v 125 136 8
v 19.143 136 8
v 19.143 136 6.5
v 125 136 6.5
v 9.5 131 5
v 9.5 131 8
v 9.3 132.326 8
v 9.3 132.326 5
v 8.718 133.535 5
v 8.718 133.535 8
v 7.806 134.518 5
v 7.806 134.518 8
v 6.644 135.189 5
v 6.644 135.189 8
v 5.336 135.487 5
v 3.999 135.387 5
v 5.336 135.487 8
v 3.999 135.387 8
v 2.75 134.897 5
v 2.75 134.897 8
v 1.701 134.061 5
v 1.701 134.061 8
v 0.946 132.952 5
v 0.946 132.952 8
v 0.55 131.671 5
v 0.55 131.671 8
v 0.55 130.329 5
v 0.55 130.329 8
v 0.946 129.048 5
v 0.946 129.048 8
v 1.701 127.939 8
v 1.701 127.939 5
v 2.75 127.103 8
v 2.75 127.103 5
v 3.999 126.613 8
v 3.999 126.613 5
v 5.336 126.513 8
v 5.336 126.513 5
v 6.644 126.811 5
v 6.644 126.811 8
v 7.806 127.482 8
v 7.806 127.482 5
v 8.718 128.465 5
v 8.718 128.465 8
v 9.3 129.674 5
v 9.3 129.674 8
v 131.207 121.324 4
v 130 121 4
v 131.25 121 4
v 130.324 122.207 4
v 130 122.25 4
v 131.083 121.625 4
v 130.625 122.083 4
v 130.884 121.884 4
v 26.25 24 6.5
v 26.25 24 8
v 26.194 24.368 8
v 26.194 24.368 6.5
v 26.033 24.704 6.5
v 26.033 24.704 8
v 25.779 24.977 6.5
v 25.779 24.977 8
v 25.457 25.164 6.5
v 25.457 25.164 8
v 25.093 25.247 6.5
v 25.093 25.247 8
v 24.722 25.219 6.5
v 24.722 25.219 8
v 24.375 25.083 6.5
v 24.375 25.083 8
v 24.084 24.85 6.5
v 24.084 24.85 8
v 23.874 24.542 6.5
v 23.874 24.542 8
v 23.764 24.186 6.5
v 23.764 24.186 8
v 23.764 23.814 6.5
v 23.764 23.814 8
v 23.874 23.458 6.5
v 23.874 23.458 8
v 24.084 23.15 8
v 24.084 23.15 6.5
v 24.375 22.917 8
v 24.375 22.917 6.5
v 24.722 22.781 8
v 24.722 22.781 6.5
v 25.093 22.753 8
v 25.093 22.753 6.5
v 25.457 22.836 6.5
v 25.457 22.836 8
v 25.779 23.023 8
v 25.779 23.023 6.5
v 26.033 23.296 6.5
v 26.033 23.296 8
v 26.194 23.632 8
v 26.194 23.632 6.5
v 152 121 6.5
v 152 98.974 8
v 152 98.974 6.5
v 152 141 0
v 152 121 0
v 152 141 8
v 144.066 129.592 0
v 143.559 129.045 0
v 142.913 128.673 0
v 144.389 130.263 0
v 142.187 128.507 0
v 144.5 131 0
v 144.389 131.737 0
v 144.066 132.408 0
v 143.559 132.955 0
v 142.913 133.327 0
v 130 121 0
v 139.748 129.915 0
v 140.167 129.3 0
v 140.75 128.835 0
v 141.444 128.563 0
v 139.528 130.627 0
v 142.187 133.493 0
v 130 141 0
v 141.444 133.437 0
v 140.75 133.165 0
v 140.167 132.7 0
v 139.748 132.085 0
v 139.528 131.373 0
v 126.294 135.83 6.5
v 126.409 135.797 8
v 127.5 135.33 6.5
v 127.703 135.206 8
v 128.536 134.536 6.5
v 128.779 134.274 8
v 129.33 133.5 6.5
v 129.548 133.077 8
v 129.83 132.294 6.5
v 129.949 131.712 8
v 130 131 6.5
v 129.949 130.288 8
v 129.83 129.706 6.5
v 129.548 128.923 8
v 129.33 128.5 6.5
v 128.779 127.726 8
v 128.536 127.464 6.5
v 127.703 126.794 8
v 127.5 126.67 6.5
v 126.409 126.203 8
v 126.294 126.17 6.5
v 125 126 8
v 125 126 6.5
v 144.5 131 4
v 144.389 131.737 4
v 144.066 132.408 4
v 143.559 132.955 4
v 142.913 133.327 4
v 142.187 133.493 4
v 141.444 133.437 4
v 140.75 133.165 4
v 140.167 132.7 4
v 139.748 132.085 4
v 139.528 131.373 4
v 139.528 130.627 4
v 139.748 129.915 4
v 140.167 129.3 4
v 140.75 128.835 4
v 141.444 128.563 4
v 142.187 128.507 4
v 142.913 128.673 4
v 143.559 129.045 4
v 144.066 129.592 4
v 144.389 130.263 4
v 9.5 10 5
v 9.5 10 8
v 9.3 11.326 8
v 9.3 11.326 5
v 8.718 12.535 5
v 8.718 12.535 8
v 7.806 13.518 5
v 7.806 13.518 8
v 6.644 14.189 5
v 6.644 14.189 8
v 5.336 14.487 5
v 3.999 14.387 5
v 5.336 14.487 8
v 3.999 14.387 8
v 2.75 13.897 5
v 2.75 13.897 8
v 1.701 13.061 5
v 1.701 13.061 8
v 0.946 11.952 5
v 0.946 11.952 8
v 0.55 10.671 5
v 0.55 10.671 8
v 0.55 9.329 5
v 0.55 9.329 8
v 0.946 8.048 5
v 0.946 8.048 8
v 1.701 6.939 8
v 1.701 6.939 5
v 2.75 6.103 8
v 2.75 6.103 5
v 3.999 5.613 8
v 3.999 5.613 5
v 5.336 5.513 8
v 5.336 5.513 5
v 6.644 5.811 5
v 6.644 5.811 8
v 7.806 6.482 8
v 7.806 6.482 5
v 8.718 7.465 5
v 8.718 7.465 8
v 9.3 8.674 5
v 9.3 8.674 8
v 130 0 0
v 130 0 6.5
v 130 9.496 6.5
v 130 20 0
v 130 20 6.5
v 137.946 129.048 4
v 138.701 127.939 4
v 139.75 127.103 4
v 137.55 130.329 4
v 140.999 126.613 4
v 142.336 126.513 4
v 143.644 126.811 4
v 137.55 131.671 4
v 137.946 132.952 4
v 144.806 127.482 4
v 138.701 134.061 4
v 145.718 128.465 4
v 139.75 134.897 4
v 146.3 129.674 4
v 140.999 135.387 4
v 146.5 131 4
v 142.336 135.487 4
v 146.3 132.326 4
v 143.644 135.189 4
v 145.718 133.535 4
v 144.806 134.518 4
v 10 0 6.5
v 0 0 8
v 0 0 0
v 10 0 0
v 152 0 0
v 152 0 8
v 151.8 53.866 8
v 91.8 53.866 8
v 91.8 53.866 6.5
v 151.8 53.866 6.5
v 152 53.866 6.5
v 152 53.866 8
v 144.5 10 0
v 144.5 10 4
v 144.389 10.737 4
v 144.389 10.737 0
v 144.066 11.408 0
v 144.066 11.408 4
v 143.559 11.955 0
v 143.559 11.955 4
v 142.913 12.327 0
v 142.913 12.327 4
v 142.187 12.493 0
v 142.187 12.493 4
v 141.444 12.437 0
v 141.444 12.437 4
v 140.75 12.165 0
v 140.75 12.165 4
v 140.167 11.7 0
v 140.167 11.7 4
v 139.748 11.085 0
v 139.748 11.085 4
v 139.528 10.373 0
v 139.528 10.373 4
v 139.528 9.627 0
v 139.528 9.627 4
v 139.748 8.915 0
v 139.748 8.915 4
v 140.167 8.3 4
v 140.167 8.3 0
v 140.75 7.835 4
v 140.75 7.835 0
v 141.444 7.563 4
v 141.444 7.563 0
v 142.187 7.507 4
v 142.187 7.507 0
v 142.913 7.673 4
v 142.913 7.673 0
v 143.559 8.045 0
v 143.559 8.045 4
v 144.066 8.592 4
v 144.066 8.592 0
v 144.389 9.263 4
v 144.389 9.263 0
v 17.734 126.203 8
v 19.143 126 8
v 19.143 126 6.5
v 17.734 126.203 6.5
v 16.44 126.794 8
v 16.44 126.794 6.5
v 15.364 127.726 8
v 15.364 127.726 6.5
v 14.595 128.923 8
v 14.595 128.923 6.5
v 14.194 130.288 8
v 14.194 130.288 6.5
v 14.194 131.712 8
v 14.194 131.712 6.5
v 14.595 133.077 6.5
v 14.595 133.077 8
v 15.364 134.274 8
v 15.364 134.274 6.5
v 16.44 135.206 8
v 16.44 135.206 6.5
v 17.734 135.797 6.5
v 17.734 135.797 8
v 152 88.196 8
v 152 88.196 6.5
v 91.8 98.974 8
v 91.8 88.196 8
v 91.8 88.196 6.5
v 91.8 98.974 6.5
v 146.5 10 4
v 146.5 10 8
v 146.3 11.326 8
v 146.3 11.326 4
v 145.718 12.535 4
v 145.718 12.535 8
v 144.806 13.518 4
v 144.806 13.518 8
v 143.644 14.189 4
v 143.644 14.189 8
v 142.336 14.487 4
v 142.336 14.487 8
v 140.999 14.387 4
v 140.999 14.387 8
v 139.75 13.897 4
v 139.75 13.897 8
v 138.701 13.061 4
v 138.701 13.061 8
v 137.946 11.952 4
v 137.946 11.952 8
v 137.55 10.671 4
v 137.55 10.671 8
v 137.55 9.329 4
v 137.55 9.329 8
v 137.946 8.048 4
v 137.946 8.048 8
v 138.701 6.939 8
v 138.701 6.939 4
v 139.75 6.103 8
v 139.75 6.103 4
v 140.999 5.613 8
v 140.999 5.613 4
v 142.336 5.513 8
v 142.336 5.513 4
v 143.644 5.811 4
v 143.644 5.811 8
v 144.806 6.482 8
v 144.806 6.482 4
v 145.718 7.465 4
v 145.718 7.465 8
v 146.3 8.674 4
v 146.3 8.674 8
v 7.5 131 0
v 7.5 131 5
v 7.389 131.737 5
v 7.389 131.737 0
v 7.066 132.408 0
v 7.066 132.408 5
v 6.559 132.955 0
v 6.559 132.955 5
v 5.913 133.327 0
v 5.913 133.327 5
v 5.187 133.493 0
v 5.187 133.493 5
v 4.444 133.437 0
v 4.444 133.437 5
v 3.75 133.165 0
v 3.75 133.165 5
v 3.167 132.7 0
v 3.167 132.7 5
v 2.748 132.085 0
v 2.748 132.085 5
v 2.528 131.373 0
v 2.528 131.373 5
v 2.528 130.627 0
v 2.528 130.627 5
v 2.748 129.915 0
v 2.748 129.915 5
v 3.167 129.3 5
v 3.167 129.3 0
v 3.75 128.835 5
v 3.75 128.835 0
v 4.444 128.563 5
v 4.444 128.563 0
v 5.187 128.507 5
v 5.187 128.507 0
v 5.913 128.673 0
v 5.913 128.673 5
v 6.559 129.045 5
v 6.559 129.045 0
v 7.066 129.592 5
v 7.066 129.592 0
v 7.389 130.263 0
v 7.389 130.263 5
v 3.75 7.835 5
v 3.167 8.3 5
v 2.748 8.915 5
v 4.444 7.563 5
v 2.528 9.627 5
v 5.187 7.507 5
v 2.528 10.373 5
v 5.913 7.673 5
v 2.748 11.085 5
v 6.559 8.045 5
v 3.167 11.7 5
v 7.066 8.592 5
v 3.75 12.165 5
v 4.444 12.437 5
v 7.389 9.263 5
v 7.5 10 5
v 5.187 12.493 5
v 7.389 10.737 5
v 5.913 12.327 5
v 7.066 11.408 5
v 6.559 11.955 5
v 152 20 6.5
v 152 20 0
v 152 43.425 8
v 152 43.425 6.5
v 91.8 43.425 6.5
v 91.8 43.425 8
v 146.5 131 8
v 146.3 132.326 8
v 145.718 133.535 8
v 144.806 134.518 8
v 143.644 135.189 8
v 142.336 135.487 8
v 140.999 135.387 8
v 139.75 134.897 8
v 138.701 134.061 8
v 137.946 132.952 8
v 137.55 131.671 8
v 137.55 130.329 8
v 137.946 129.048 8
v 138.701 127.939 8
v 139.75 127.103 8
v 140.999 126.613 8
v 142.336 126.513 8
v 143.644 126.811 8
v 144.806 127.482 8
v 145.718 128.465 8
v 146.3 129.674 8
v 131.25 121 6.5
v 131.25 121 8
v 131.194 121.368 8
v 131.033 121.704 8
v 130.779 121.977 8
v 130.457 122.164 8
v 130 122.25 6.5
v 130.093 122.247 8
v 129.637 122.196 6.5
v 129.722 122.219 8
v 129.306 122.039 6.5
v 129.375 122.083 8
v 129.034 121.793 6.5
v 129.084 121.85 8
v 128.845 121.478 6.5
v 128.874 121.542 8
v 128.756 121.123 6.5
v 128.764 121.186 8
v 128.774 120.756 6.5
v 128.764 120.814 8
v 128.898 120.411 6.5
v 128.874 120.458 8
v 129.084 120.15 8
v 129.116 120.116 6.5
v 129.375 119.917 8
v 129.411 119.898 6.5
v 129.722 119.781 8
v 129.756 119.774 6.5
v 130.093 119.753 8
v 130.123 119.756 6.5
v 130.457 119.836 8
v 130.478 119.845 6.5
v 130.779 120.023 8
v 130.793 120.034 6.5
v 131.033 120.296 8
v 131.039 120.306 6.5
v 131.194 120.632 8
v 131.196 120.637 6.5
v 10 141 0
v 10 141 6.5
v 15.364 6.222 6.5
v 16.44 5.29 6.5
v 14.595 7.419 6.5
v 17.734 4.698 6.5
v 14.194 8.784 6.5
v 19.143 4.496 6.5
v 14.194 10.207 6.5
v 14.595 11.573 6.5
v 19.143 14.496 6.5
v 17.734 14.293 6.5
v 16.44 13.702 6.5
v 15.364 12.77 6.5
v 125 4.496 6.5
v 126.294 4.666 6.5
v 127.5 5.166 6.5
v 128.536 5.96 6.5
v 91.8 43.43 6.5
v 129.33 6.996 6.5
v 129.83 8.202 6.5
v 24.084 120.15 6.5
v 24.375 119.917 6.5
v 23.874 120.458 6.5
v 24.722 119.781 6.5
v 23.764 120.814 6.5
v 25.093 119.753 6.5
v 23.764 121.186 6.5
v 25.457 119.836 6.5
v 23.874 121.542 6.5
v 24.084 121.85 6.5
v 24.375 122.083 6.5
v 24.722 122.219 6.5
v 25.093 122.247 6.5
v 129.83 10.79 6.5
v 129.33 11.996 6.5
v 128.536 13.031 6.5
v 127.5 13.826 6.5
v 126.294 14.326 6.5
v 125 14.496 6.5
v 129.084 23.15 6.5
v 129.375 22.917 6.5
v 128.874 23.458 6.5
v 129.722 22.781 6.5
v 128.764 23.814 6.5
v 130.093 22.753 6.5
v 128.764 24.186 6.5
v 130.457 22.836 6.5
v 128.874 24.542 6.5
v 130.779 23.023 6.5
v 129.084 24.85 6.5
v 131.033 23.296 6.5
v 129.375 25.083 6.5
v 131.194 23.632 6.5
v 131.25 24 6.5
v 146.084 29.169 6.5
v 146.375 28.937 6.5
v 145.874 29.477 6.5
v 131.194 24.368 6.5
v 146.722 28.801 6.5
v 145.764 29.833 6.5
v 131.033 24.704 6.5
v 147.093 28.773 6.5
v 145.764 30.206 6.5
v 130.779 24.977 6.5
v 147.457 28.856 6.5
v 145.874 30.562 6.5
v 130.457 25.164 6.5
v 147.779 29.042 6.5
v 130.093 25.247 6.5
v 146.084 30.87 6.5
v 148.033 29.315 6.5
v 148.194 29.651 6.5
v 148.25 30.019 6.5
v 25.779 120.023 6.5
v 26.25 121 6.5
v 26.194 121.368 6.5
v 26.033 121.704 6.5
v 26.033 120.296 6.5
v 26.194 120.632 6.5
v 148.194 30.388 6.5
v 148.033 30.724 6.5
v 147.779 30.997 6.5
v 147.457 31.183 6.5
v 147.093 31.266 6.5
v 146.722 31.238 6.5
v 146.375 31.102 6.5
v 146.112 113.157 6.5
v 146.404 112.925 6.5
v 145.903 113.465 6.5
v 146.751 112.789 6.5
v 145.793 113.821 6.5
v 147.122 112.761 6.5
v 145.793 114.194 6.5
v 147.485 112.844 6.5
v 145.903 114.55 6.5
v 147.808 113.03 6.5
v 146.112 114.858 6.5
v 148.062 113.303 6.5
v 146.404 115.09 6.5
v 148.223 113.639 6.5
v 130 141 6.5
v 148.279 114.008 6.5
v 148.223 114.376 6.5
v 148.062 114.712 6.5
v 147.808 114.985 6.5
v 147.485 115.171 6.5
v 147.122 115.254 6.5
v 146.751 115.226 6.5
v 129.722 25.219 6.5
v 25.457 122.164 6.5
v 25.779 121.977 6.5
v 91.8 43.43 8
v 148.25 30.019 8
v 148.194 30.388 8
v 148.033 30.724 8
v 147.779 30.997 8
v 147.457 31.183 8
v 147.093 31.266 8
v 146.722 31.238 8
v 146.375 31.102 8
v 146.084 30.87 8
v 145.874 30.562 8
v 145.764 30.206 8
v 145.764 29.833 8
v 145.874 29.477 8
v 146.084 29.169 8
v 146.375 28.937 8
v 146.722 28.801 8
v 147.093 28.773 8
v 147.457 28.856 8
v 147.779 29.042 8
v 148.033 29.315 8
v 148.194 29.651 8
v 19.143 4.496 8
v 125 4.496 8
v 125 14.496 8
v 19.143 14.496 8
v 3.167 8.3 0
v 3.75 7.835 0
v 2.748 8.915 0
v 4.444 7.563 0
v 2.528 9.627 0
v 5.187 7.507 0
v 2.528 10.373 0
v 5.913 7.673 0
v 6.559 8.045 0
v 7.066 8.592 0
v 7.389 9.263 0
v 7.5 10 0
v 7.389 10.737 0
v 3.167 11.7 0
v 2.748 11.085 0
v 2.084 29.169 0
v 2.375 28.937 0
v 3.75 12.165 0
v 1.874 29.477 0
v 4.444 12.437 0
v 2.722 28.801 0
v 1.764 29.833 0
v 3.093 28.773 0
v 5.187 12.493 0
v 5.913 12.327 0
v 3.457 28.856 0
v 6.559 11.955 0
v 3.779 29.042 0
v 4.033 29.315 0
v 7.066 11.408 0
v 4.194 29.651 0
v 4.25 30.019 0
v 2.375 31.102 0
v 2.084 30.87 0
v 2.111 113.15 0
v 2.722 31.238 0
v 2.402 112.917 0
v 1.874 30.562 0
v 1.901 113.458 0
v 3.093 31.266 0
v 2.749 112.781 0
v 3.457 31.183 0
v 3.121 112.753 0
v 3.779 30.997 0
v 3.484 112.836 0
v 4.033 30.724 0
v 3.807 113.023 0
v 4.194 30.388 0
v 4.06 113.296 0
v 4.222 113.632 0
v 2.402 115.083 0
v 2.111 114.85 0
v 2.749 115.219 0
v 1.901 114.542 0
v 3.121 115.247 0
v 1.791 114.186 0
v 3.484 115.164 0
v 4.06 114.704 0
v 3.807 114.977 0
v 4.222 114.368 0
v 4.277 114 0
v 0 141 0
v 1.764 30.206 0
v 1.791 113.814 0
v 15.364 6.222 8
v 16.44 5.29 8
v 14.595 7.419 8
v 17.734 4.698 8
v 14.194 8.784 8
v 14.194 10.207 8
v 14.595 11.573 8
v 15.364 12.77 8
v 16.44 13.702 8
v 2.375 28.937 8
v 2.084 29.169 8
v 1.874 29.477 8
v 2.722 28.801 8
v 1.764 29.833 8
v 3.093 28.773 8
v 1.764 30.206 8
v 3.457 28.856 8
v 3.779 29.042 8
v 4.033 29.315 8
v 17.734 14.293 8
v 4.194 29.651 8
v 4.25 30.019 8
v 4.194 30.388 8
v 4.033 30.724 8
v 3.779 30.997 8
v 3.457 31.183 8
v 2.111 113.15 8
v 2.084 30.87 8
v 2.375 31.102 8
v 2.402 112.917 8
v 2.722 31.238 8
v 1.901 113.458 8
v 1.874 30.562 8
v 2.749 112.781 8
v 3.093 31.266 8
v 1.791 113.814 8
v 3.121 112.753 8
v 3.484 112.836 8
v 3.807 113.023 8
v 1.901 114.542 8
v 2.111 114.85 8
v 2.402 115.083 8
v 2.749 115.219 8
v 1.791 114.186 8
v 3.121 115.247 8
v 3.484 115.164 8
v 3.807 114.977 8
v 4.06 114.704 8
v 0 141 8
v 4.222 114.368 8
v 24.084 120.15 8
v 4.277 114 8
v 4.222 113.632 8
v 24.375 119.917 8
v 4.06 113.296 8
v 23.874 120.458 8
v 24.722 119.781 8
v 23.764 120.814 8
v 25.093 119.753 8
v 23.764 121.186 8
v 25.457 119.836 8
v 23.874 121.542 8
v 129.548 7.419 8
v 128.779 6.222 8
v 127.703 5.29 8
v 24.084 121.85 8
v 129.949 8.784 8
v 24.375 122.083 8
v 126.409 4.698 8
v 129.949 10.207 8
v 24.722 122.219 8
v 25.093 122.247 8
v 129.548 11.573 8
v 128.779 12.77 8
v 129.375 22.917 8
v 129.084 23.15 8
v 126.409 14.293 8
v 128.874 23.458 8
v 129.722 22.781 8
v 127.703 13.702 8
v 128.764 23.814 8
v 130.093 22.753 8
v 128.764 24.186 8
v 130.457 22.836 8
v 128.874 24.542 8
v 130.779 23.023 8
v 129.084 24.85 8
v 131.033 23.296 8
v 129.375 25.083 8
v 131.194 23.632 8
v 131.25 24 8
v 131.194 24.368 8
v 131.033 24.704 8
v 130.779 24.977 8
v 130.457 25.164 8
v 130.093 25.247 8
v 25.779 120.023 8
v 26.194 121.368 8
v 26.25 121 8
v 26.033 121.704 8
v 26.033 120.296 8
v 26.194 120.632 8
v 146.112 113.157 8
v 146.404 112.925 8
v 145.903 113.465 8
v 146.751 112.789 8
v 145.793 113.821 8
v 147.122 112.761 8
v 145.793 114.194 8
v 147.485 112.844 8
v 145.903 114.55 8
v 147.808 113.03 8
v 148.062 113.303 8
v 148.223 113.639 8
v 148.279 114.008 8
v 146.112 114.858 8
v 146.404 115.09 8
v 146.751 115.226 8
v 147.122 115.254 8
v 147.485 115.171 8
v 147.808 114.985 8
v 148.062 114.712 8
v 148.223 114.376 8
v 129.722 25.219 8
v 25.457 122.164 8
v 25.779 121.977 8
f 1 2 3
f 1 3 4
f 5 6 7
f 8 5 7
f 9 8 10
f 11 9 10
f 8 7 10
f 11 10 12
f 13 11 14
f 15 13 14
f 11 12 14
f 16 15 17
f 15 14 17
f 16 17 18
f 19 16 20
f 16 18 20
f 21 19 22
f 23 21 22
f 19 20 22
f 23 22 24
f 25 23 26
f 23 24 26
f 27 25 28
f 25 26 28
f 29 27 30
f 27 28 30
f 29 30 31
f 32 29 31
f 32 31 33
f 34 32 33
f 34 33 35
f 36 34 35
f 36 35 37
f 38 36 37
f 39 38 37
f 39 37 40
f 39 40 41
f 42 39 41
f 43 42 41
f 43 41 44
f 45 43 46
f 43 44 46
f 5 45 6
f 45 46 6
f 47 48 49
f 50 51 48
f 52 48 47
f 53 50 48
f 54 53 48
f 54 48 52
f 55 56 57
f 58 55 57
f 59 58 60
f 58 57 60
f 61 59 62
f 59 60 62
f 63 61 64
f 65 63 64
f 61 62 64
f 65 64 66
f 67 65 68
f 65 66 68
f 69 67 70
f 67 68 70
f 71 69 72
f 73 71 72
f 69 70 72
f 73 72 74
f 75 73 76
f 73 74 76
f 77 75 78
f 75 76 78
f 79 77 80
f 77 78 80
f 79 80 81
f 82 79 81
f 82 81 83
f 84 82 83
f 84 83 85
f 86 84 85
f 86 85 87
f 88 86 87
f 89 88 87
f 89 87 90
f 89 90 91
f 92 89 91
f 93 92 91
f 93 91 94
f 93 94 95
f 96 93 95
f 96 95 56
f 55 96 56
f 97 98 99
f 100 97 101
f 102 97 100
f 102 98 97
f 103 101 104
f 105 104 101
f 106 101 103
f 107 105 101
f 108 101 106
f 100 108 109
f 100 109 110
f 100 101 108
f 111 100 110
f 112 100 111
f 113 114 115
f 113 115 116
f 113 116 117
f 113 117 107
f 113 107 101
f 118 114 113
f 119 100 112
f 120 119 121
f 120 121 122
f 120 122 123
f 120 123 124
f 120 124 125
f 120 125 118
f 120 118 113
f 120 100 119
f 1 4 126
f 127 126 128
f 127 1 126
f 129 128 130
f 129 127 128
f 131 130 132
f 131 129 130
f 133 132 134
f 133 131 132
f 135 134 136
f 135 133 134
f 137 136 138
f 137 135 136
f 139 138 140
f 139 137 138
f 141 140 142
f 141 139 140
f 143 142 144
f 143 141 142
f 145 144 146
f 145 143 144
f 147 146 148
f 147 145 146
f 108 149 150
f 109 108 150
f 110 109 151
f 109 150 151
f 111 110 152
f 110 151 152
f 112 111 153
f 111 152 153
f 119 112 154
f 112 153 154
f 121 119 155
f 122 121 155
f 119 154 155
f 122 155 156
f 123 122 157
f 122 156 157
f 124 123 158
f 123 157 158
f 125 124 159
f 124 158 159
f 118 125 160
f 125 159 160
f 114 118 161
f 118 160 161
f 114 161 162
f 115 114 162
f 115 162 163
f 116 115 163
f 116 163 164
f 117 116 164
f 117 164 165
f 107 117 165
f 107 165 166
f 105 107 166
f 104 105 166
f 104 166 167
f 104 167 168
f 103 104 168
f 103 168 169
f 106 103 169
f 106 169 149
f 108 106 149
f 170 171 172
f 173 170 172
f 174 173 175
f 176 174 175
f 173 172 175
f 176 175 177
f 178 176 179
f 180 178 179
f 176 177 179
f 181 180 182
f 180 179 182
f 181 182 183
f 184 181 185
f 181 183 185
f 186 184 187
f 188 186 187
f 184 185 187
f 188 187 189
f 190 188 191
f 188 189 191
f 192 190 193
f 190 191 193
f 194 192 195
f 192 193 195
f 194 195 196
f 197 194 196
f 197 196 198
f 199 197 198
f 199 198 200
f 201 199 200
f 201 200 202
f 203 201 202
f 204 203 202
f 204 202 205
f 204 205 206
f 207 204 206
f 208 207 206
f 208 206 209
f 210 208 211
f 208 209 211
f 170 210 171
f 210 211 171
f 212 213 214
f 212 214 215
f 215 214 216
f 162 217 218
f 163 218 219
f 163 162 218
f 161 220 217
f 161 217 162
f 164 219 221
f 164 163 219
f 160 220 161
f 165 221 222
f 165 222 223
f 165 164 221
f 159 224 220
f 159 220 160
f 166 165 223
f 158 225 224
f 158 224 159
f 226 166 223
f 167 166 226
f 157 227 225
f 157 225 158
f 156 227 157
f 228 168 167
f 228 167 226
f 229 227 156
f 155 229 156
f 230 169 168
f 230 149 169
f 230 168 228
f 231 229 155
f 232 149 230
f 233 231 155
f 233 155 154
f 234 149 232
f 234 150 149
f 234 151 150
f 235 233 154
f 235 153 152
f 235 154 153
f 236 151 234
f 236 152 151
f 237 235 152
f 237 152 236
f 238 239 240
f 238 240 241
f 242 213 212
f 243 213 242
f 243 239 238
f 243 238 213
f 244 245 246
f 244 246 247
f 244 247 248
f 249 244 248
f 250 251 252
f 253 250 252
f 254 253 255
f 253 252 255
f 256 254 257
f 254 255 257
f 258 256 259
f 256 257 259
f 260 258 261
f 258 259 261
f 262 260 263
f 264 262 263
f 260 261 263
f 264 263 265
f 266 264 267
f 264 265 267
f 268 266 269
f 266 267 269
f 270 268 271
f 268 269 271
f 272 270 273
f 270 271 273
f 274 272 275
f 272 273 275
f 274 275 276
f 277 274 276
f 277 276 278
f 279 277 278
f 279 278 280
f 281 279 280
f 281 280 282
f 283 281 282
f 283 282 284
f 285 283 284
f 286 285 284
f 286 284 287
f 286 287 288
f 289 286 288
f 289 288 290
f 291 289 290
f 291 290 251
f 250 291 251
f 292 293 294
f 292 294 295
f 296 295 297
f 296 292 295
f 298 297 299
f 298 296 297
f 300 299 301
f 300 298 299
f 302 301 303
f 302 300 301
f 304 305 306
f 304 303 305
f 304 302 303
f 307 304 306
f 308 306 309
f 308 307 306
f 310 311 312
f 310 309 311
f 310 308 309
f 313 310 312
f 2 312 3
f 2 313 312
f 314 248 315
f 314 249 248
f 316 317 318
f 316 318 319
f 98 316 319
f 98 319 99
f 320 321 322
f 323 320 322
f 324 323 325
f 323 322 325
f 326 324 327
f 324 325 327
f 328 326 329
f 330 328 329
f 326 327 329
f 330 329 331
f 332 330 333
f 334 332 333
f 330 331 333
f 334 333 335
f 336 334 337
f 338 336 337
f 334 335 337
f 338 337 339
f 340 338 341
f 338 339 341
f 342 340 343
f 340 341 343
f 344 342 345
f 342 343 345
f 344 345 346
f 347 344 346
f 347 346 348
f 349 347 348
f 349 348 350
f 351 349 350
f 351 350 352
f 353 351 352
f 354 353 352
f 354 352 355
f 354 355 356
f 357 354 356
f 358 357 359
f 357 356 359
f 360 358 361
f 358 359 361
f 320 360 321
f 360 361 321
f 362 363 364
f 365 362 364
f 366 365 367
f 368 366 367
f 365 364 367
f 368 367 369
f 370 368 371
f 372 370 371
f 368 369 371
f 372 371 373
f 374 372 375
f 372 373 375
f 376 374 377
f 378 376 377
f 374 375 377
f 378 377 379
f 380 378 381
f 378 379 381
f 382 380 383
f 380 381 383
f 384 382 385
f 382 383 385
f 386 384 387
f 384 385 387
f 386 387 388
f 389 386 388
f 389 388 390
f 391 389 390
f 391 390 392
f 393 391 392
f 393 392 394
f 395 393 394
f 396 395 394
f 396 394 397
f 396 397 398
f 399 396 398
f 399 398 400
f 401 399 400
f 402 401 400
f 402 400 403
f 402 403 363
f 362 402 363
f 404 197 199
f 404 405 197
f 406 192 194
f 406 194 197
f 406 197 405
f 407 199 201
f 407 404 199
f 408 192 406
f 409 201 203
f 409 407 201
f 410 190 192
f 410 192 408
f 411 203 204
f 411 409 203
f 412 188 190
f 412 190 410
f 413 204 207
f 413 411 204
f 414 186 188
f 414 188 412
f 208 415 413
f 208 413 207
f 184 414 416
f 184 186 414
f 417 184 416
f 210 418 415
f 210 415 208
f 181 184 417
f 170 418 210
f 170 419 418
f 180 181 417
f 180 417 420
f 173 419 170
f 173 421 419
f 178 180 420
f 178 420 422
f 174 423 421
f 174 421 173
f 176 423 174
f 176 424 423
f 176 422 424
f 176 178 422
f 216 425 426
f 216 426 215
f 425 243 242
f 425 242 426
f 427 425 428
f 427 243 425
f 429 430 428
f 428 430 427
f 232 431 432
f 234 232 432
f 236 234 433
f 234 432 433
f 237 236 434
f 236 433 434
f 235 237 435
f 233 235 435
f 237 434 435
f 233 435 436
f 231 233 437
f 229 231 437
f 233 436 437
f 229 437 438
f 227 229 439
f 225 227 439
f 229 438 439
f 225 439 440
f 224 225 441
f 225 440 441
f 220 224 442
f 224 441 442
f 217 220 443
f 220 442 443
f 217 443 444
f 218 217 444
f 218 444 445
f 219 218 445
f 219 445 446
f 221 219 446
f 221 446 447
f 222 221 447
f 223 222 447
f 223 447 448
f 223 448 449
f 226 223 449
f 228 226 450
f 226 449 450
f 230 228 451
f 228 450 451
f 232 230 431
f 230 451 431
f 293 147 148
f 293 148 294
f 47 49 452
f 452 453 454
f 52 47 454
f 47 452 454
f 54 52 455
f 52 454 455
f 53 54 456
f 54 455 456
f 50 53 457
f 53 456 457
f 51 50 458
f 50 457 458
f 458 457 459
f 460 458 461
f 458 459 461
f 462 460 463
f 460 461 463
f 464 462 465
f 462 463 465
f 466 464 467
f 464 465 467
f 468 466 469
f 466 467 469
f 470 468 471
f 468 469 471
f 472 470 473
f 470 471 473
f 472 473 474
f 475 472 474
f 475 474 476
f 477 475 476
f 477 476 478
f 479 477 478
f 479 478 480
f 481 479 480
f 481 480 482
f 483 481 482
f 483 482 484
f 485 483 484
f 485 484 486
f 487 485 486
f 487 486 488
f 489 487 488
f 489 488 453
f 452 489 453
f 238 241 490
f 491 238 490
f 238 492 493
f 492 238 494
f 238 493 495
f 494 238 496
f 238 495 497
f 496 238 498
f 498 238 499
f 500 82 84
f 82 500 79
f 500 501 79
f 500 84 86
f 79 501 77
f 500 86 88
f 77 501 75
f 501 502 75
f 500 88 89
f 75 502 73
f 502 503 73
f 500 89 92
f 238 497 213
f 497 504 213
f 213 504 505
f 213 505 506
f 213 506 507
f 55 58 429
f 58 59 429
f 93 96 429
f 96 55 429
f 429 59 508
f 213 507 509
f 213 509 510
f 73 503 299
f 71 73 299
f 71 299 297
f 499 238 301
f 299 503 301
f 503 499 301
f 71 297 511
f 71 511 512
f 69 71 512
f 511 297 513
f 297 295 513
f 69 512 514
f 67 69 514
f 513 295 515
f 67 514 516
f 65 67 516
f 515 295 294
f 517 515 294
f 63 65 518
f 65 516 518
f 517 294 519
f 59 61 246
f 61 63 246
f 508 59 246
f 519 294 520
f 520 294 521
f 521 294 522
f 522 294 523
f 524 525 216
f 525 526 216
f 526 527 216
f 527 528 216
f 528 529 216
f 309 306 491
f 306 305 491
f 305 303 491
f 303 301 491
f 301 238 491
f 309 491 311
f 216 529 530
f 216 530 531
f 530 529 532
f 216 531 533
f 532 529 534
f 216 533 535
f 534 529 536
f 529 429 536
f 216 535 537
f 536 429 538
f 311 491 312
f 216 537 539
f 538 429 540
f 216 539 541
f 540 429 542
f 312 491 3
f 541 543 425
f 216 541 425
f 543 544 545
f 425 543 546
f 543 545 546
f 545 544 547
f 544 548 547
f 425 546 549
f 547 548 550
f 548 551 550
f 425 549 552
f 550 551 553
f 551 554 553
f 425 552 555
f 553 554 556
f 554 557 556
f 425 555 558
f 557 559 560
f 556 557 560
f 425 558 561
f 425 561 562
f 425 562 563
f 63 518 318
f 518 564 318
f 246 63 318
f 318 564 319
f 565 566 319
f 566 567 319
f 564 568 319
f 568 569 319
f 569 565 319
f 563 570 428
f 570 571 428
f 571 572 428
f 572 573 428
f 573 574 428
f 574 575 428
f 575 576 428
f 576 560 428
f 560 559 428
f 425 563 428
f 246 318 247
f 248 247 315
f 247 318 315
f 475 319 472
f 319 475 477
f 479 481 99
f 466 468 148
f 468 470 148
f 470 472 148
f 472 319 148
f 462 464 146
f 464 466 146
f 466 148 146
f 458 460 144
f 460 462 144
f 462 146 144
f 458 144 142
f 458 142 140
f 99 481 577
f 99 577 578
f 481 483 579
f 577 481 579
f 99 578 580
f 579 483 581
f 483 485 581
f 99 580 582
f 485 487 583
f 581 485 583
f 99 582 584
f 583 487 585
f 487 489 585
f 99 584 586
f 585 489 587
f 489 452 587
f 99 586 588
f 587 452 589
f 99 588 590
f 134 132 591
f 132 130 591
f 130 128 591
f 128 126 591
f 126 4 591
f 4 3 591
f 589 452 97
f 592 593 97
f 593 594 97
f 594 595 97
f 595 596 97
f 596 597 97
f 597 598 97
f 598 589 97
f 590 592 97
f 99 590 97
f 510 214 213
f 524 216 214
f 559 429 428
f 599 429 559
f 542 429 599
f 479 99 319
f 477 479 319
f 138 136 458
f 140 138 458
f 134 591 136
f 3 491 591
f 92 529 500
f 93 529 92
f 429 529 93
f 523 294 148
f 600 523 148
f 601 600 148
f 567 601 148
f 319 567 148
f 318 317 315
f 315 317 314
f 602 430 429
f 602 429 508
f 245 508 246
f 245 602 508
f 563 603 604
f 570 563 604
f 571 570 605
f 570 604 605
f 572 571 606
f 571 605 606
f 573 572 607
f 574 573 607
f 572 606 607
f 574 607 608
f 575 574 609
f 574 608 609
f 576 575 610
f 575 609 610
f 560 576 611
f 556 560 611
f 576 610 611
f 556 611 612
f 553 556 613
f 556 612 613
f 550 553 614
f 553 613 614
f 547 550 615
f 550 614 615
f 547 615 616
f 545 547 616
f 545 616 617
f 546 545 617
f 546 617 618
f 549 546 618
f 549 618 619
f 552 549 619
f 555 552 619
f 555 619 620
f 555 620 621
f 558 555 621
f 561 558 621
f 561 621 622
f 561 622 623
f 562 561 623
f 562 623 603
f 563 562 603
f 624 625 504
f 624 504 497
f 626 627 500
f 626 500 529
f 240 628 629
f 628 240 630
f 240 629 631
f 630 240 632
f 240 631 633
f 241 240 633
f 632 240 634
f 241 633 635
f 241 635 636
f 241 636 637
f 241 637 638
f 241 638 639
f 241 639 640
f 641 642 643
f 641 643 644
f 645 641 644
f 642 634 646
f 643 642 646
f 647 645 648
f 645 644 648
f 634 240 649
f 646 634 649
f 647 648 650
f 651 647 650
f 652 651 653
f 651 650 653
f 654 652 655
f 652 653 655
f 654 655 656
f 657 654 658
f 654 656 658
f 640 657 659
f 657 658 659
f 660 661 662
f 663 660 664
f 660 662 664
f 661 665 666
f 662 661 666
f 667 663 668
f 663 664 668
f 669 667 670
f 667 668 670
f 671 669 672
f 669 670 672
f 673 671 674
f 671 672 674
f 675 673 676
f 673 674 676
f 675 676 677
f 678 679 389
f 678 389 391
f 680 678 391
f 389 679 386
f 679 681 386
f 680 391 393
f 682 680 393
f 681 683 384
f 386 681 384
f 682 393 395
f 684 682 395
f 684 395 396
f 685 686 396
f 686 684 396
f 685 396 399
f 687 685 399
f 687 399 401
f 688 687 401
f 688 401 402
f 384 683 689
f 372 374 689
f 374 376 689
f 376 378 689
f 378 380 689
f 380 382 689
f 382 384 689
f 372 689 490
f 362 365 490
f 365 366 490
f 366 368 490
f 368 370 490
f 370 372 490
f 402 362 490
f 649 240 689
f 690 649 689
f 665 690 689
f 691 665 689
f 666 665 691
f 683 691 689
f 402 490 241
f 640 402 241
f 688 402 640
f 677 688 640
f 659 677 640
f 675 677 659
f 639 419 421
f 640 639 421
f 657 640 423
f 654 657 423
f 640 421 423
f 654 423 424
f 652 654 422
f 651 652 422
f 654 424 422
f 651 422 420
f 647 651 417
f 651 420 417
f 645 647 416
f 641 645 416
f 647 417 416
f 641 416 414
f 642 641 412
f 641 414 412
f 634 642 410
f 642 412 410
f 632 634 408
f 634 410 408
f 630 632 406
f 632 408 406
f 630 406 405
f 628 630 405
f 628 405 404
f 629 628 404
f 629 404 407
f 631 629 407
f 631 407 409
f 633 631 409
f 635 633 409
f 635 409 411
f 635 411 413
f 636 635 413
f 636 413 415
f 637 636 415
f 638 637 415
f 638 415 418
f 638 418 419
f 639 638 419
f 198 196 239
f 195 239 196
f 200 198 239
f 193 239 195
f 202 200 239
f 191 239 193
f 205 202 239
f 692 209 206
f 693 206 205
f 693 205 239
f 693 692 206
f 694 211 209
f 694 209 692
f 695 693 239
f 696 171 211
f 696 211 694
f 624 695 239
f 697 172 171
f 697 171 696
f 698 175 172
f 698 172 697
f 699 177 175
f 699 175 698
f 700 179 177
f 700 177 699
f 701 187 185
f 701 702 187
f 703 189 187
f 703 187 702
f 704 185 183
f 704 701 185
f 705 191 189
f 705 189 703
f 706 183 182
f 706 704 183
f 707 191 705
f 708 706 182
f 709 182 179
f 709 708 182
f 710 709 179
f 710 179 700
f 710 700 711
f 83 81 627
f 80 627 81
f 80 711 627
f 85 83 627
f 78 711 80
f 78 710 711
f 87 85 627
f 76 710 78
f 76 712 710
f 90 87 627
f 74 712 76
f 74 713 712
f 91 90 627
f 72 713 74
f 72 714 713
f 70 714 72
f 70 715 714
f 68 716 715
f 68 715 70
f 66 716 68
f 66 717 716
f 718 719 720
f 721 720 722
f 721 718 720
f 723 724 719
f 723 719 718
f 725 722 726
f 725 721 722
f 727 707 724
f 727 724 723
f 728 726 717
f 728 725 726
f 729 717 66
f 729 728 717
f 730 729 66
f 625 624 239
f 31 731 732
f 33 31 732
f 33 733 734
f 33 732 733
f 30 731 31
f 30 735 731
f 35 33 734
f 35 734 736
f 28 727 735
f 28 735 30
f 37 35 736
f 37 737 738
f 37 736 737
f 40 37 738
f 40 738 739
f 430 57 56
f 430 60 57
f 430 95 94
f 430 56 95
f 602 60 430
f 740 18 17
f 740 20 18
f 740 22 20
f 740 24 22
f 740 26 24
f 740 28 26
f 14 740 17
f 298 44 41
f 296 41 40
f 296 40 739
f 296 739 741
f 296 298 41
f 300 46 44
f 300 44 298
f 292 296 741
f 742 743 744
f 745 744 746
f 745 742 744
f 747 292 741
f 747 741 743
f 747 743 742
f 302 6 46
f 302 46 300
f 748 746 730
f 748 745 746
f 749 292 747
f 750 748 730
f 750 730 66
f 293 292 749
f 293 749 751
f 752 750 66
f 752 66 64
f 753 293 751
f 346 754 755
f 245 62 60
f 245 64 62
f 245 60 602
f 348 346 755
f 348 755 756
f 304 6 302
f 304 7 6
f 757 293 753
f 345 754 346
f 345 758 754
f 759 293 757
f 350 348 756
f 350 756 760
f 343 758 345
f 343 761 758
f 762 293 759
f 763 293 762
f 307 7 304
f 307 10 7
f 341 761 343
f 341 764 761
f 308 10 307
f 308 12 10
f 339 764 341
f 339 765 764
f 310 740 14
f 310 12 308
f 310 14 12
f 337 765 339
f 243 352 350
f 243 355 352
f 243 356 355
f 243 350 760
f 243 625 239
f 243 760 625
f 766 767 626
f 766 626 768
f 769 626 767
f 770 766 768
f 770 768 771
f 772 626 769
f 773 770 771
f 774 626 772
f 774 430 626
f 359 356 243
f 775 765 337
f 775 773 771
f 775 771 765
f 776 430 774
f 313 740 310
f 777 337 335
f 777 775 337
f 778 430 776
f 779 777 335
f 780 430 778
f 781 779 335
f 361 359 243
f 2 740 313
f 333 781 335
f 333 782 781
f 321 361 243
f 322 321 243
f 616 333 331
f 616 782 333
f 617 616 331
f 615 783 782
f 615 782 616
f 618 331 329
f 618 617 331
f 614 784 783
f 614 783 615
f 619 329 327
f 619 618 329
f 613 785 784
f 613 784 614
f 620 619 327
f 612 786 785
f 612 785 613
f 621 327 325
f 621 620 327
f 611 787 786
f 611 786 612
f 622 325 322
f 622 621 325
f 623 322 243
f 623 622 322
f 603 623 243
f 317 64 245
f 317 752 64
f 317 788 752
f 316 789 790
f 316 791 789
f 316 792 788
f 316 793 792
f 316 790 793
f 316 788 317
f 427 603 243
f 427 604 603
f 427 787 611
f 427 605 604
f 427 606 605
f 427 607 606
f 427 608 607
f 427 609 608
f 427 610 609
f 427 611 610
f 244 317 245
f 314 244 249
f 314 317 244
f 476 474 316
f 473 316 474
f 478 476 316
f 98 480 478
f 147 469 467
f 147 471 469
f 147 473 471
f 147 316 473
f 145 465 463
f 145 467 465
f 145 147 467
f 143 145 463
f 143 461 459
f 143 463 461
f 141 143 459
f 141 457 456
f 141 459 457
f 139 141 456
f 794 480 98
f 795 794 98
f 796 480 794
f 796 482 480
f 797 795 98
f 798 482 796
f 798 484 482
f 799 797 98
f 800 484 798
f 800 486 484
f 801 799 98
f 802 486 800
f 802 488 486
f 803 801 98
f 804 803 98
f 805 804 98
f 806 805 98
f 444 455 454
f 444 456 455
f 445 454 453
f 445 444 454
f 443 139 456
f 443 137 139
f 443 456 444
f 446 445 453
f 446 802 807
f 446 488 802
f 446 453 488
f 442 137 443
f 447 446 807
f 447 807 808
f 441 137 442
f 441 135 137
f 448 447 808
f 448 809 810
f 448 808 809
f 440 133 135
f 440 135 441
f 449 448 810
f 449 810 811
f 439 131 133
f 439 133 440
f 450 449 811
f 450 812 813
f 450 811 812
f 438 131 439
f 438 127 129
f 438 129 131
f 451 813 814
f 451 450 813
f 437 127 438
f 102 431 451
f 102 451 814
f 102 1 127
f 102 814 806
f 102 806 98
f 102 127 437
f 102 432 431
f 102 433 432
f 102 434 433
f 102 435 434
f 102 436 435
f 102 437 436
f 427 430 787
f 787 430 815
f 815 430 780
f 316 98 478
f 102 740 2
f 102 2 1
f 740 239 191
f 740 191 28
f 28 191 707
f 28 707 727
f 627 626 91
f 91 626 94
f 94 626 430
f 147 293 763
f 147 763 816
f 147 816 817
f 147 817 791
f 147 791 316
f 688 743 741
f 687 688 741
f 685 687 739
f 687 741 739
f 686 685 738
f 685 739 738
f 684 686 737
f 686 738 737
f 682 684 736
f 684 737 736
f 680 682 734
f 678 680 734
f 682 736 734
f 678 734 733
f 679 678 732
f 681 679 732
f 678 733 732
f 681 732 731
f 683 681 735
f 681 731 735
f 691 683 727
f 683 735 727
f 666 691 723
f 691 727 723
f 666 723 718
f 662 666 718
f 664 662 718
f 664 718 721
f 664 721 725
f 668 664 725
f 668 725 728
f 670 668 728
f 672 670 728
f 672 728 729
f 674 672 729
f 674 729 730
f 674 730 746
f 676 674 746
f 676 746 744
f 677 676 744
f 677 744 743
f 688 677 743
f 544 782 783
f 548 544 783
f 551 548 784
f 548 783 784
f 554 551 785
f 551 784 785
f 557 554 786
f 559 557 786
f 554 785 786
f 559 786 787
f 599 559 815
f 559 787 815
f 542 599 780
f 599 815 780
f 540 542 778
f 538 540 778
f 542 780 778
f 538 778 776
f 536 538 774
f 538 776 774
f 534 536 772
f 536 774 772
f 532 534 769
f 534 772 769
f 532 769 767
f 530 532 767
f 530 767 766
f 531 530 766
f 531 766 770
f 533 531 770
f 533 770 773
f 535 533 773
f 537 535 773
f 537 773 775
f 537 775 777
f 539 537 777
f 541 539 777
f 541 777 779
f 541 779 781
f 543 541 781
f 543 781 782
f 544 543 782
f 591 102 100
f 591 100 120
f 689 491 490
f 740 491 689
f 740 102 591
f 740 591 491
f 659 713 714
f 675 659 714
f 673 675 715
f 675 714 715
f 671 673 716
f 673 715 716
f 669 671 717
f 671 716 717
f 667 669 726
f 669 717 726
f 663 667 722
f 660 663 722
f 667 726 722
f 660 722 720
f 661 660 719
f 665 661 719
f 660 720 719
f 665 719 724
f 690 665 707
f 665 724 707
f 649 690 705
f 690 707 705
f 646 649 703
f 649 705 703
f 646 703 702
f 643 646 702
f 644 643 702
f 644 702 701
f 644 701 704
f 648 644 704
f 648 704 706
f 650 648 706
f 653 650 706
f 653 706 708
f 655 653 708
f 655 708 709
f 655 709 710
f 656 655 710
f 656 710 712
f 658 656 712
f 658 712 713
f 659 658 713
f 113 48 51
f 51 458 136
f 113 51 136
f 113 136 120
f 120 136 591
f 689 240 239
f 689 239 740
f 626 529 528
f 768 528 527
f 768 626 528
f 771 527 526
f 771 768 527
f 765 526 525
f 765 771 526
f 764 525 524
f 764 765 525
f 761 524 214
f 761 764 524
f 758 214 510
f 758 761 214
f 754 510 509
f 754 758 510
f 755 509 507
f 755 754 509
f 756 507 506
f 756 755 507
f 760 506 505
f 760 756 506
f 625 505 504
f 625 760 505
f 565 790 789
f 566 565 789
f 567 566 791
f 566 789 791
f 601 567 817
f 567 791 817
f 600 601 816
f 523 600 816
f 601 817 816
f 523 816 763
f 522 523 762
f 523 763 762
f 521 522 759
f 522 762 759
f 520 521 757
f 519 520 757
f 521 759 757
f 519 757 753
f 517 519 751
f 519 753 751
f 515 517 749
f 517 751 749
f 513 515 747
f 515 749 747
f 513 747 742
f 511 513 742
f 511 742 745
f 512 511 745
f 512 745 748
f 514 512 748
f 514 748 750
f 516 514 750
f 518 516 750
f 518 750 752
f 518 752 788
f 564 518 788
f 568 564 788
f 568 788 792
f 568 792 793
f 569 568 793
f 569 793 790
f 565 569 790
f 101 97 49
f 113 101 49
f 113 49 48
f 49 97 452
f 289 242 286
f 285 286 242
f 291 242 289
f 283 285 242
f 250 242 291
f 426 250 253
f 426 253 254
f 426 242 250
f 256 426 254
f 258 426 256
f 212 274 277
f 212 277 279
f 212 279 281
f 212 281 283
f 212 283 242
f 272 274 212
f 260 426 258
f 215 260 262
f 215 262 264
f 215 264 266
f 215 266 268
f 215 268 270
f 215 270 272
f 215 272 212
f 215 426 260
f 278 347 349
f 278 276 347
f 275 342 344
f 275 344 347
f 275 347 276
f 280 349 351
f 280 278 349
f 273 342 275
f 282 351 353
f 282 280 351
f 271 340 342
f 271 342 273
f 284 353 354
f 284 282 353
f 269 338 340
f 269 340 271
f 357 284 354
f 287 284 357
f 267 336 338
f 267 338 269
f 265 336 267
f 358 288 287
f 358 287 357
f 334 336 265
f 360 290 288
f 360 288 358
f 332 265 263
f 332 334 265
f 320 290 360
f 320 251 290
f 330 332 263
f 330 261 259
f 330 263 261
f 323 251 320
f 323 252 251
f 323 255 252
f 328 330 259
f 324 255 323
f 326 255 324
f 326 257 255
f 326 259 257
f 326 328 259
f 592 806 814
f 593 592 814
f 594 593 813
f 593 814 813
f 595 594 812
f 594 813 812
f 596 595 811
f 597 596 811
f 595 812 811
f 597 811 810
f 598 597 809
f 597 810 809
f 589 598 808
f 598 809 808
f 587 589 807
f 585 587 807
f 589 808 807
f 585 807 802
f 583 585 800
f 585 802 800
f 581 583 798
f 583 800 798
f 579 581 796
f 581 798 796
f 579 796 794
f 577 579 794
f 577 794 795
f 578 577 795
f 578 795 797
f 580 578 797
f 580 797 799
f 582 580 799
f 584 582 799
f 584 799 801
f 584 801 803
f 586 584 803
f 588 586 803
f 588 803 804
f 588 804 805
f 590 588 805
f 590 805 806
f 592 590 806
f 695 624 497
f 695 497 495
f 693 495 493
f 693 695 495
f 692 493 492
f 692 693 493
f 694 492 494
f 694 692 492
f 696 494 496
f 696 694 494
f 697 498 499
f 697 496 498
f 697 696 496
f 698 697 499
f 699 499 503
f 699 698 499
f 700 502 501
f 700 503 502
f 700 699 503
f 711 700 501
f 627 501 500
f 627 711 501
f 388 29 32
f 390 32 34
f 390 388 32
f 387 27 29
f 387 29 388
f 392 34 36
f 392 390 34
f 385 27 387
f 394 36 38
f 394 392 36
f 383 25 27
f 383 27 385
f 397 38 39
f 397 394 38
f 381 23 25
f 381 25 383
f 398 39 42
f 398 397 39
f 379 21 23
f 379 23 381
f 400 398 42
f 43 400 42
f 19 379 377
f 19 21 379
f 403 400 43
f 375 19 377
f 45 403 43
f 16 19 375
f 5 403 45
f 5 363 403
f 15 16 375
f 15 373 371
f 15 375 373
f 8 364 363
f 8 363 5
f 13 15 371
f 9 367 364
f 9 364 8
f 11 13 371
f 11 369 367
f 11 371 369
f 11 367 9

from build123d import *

# Parameters (mm, degrees)
SKETCH1_W           = 10
SKETCH1_H           = 141
BOSS_EXTRUDE1_DEPTH = 8
SKETCH2_R           = 2.5
CUT_EXTRUDE1_DEPTH  = 8
SKETCH3_W           = 142
SKETCH3_H           = 141
BOSS_EXTRUDE2_DEPTH = 1.5
CUT_EXTRUDE4_DEPTH  = 24
SKETCH12_W          = 60
SKETCH12_H          = 10.777657791
SKETCH12_H_2        = 10.436358021
CUT_EXTRUDE6_DEPTH  = 10
SKETCH14_W          = 22
SKETCH14_H          = 20
BOSS_EXTRUDE5_DEPTH = 6.5
SKETCH16_W          = 61.380351881
SKETCH16_H          = 10.777657791
SKETCH16_H_2        = 10.440898972
CUT_EXTRUDE9_DEPTH  = 26.5
SKETCH17_R          = 4.5
CUT_EXTRUDE10_DEPTH = 3
SKETCH9_R           = 1.25
CUT_EXTRUDE11_DEPTH = 14
SKETCH13_R          = 2.5
CUT_EXTRUDE12_DEPTH = 14
SKETCH19_R          = 4.5
CUT_EXTRUDE13_DEPTH = 4
SKETCH20_R          = 1.25
CUT_EXTRUDE14_DEPTH = 4


with BuildPart() as part:
    # Sketch1 → Boss-Extrude1 (new body)
    with BuildSketch(Plane.XY):
        with Locations((5, 70.5)):
            Rectangle(SKETCH1_W, SKETCH1_H)
    extrude(amount=BOSS_EXTRUDE1_DEPTH)

    # Sketch2 → Cut-Extrude1 (cut)
    with BuildSketch(Plane.XY.offset(8)):
        with Locations((5, 131)):
            Circle(SKETCH2_R)
        with Locations((5, 10)):
            Circle(SKETCH2_R)
    extrude(amount=-CUT_EXTRUDE1_DEPTH, mode=Mode.SUBTRACT)

    # Sketch3 → Boss-Extrude2 (add)
    with BuildSketch(Plane.XY.offset(8)):
        with Locations((81, 70.5)):
            Rectangle(SKETCH3_W, SKETCH3_H)
    extrude(amount=-BOSS_EXTRUDE2_DEPTH)

    # Sketch8 → Cut-Extrude4 (cut)
    with BuildSketch(Plane.XY.offset(8)):
        with BuildLine():
            Line((19.143151415, 136), (125, 136))
            ThreePointArc((125, 136), (130, 131), (125, 126))
            Line((125, 126), (19.143151415, 126))
            ThreePointArc((19.143151415, 126), (14.143151415, 131), (19.143151415, 136))
        make_face()
        with BuildLine():
            Line((19.143151415, 14.495923054), (125, 14.495923054))
            ThreePointArc((125, 14.495923054), (130, 9.495923054), (125, 4.495923054))
            Line((125, 4.495923054), (19.143151415, 4.495923054))
            ThreePointArc((19.143151415, 4.495923054), (14.143151415, 9.495923054), (19.143151415, 14.495923054))
        make_face()
    extrude(amount=-CUT_EXTRUDE4_DEPTH, mode=Mode.SUBTRACT)

    # Sketch12 → Cut-Extrude6 (cut)
    with BuildSketch(Plane.XY.offset(8)):
        with Locations((121.8, 93.584876831)):
            Rectangle(SKETCH12_W, SKETCH12_H)
        with Locations((121.8, 48.647743856)):
            Rectangle(SKETCH12_W, SKETCH12_H_2)
    extrude(amount=-CUT_EXTRUDE6_DEPTH, mode=Mode.SUBTRACT)

    # Sketch14 → Boss-Extrude5 (add)
    with BuildSketch(Plane(origin=(0, 0, 6.5), x_dir=(-1, 0, 0), z_dir=(0, 0, -1))):
        with Locations((-141, 131)):
            Rectangle(SKETCH14_W, SKETCH14_H)
        with Locations((-141, 10)):
            Rectangle(SKETCH14_W, SKETCH14_H)
    extrude(amount=BOSS_EXTRUDE5_DEPTH)

    # Sketch16 → Cut-Extrude9 (cut)
    with BuildSketch(Plane.XY.offset(8)):
        with Locations((122.490175941, 93.584876831)):
            Rectangle(SKETCH16_W, SKETCH16_H)
        with Locations((122.490175941, 48.64547338)):
            Rectangle(SKETCH16_W, SKETCH16_H_2)
    extrude(amount=-CUT_EXTRUDE9_DEPTH, mode=Mode.SUBTRACT)

    # Sketch17 → Cut-Extrude10 (cut)
    with BuildSketch(Plane.XY.offset(8)):
        with Locations((5, 131)):
            Circle(SKETCH17_R)
        with Locations((5, 10)):
            Circle(SKETCH17_R)
    extrude(amount=-CUT_EXTRUDE10_DEPTH, mode=Mode.SUBTRACT)

    # Sketch9 → Cut-Extrude11 (cut)
    with BuildSketch(Plane.XY.offset(8)):
        with Locations((147.028762267, 114.00755189)):
            Circle(SKETCH9_R)
        with Locations((3.027444188, 114)):
            Circle(SKETCH9_R)
        with Locations((3, 30.019439847)):
            Circle(SKETCH9_R)
        with Locations((147, 30.019439847)):
            Circle(SKETCH9_R)
    extrude(amount=-CUT_EXTRUDE11_DEPTH, mode=Mode.SUBTRACT)

    # Sketch13 → Cut-Extrude12 (cut)
    with BuildSketch(Plane.XY.offset(8)):
        with Locations((142, 131)):
            Circle(SKETCH13_R)
        with Locations((142, 10)):
            Circle(SKETCH13_R)
    extrude(amount=-CUT_EXTRUDE12_DEPTH, mode=Mode.SUBTRACT)

    # Sketch19 → Cut-Extrude13 (cut)
    with BuildSketch(Plane.XY.offset(8)):
        with Locations((142, 131)):
            Circle(SKETCH19_R)
        with Locations((142, 10)):
            Circle(SKETCH19_R)
    extrude(amount=-CUT_EXTRUDE13_DEPTH, mode=Mode.SUBTRACT)

    # Sketch20 → Cut-Extrude14 (cut)
    with BuildSketch(Plane.XY.offset(8)):
        with Locations((25, 121)):
            Circle(SKETCH20_R)
        with Locations((130, 121)):
            Circle(SKETCH20_R)
        with Locations((130, 24)):
            Circle(SKETCH20_R)
        with Locations((25, 24)):
            Circle(SKETCH20_R)
    extrude(amount=-CUT_EXTRUDE14_DEPTH, mode=Mode.SUBTRACT)


solid = part.part
